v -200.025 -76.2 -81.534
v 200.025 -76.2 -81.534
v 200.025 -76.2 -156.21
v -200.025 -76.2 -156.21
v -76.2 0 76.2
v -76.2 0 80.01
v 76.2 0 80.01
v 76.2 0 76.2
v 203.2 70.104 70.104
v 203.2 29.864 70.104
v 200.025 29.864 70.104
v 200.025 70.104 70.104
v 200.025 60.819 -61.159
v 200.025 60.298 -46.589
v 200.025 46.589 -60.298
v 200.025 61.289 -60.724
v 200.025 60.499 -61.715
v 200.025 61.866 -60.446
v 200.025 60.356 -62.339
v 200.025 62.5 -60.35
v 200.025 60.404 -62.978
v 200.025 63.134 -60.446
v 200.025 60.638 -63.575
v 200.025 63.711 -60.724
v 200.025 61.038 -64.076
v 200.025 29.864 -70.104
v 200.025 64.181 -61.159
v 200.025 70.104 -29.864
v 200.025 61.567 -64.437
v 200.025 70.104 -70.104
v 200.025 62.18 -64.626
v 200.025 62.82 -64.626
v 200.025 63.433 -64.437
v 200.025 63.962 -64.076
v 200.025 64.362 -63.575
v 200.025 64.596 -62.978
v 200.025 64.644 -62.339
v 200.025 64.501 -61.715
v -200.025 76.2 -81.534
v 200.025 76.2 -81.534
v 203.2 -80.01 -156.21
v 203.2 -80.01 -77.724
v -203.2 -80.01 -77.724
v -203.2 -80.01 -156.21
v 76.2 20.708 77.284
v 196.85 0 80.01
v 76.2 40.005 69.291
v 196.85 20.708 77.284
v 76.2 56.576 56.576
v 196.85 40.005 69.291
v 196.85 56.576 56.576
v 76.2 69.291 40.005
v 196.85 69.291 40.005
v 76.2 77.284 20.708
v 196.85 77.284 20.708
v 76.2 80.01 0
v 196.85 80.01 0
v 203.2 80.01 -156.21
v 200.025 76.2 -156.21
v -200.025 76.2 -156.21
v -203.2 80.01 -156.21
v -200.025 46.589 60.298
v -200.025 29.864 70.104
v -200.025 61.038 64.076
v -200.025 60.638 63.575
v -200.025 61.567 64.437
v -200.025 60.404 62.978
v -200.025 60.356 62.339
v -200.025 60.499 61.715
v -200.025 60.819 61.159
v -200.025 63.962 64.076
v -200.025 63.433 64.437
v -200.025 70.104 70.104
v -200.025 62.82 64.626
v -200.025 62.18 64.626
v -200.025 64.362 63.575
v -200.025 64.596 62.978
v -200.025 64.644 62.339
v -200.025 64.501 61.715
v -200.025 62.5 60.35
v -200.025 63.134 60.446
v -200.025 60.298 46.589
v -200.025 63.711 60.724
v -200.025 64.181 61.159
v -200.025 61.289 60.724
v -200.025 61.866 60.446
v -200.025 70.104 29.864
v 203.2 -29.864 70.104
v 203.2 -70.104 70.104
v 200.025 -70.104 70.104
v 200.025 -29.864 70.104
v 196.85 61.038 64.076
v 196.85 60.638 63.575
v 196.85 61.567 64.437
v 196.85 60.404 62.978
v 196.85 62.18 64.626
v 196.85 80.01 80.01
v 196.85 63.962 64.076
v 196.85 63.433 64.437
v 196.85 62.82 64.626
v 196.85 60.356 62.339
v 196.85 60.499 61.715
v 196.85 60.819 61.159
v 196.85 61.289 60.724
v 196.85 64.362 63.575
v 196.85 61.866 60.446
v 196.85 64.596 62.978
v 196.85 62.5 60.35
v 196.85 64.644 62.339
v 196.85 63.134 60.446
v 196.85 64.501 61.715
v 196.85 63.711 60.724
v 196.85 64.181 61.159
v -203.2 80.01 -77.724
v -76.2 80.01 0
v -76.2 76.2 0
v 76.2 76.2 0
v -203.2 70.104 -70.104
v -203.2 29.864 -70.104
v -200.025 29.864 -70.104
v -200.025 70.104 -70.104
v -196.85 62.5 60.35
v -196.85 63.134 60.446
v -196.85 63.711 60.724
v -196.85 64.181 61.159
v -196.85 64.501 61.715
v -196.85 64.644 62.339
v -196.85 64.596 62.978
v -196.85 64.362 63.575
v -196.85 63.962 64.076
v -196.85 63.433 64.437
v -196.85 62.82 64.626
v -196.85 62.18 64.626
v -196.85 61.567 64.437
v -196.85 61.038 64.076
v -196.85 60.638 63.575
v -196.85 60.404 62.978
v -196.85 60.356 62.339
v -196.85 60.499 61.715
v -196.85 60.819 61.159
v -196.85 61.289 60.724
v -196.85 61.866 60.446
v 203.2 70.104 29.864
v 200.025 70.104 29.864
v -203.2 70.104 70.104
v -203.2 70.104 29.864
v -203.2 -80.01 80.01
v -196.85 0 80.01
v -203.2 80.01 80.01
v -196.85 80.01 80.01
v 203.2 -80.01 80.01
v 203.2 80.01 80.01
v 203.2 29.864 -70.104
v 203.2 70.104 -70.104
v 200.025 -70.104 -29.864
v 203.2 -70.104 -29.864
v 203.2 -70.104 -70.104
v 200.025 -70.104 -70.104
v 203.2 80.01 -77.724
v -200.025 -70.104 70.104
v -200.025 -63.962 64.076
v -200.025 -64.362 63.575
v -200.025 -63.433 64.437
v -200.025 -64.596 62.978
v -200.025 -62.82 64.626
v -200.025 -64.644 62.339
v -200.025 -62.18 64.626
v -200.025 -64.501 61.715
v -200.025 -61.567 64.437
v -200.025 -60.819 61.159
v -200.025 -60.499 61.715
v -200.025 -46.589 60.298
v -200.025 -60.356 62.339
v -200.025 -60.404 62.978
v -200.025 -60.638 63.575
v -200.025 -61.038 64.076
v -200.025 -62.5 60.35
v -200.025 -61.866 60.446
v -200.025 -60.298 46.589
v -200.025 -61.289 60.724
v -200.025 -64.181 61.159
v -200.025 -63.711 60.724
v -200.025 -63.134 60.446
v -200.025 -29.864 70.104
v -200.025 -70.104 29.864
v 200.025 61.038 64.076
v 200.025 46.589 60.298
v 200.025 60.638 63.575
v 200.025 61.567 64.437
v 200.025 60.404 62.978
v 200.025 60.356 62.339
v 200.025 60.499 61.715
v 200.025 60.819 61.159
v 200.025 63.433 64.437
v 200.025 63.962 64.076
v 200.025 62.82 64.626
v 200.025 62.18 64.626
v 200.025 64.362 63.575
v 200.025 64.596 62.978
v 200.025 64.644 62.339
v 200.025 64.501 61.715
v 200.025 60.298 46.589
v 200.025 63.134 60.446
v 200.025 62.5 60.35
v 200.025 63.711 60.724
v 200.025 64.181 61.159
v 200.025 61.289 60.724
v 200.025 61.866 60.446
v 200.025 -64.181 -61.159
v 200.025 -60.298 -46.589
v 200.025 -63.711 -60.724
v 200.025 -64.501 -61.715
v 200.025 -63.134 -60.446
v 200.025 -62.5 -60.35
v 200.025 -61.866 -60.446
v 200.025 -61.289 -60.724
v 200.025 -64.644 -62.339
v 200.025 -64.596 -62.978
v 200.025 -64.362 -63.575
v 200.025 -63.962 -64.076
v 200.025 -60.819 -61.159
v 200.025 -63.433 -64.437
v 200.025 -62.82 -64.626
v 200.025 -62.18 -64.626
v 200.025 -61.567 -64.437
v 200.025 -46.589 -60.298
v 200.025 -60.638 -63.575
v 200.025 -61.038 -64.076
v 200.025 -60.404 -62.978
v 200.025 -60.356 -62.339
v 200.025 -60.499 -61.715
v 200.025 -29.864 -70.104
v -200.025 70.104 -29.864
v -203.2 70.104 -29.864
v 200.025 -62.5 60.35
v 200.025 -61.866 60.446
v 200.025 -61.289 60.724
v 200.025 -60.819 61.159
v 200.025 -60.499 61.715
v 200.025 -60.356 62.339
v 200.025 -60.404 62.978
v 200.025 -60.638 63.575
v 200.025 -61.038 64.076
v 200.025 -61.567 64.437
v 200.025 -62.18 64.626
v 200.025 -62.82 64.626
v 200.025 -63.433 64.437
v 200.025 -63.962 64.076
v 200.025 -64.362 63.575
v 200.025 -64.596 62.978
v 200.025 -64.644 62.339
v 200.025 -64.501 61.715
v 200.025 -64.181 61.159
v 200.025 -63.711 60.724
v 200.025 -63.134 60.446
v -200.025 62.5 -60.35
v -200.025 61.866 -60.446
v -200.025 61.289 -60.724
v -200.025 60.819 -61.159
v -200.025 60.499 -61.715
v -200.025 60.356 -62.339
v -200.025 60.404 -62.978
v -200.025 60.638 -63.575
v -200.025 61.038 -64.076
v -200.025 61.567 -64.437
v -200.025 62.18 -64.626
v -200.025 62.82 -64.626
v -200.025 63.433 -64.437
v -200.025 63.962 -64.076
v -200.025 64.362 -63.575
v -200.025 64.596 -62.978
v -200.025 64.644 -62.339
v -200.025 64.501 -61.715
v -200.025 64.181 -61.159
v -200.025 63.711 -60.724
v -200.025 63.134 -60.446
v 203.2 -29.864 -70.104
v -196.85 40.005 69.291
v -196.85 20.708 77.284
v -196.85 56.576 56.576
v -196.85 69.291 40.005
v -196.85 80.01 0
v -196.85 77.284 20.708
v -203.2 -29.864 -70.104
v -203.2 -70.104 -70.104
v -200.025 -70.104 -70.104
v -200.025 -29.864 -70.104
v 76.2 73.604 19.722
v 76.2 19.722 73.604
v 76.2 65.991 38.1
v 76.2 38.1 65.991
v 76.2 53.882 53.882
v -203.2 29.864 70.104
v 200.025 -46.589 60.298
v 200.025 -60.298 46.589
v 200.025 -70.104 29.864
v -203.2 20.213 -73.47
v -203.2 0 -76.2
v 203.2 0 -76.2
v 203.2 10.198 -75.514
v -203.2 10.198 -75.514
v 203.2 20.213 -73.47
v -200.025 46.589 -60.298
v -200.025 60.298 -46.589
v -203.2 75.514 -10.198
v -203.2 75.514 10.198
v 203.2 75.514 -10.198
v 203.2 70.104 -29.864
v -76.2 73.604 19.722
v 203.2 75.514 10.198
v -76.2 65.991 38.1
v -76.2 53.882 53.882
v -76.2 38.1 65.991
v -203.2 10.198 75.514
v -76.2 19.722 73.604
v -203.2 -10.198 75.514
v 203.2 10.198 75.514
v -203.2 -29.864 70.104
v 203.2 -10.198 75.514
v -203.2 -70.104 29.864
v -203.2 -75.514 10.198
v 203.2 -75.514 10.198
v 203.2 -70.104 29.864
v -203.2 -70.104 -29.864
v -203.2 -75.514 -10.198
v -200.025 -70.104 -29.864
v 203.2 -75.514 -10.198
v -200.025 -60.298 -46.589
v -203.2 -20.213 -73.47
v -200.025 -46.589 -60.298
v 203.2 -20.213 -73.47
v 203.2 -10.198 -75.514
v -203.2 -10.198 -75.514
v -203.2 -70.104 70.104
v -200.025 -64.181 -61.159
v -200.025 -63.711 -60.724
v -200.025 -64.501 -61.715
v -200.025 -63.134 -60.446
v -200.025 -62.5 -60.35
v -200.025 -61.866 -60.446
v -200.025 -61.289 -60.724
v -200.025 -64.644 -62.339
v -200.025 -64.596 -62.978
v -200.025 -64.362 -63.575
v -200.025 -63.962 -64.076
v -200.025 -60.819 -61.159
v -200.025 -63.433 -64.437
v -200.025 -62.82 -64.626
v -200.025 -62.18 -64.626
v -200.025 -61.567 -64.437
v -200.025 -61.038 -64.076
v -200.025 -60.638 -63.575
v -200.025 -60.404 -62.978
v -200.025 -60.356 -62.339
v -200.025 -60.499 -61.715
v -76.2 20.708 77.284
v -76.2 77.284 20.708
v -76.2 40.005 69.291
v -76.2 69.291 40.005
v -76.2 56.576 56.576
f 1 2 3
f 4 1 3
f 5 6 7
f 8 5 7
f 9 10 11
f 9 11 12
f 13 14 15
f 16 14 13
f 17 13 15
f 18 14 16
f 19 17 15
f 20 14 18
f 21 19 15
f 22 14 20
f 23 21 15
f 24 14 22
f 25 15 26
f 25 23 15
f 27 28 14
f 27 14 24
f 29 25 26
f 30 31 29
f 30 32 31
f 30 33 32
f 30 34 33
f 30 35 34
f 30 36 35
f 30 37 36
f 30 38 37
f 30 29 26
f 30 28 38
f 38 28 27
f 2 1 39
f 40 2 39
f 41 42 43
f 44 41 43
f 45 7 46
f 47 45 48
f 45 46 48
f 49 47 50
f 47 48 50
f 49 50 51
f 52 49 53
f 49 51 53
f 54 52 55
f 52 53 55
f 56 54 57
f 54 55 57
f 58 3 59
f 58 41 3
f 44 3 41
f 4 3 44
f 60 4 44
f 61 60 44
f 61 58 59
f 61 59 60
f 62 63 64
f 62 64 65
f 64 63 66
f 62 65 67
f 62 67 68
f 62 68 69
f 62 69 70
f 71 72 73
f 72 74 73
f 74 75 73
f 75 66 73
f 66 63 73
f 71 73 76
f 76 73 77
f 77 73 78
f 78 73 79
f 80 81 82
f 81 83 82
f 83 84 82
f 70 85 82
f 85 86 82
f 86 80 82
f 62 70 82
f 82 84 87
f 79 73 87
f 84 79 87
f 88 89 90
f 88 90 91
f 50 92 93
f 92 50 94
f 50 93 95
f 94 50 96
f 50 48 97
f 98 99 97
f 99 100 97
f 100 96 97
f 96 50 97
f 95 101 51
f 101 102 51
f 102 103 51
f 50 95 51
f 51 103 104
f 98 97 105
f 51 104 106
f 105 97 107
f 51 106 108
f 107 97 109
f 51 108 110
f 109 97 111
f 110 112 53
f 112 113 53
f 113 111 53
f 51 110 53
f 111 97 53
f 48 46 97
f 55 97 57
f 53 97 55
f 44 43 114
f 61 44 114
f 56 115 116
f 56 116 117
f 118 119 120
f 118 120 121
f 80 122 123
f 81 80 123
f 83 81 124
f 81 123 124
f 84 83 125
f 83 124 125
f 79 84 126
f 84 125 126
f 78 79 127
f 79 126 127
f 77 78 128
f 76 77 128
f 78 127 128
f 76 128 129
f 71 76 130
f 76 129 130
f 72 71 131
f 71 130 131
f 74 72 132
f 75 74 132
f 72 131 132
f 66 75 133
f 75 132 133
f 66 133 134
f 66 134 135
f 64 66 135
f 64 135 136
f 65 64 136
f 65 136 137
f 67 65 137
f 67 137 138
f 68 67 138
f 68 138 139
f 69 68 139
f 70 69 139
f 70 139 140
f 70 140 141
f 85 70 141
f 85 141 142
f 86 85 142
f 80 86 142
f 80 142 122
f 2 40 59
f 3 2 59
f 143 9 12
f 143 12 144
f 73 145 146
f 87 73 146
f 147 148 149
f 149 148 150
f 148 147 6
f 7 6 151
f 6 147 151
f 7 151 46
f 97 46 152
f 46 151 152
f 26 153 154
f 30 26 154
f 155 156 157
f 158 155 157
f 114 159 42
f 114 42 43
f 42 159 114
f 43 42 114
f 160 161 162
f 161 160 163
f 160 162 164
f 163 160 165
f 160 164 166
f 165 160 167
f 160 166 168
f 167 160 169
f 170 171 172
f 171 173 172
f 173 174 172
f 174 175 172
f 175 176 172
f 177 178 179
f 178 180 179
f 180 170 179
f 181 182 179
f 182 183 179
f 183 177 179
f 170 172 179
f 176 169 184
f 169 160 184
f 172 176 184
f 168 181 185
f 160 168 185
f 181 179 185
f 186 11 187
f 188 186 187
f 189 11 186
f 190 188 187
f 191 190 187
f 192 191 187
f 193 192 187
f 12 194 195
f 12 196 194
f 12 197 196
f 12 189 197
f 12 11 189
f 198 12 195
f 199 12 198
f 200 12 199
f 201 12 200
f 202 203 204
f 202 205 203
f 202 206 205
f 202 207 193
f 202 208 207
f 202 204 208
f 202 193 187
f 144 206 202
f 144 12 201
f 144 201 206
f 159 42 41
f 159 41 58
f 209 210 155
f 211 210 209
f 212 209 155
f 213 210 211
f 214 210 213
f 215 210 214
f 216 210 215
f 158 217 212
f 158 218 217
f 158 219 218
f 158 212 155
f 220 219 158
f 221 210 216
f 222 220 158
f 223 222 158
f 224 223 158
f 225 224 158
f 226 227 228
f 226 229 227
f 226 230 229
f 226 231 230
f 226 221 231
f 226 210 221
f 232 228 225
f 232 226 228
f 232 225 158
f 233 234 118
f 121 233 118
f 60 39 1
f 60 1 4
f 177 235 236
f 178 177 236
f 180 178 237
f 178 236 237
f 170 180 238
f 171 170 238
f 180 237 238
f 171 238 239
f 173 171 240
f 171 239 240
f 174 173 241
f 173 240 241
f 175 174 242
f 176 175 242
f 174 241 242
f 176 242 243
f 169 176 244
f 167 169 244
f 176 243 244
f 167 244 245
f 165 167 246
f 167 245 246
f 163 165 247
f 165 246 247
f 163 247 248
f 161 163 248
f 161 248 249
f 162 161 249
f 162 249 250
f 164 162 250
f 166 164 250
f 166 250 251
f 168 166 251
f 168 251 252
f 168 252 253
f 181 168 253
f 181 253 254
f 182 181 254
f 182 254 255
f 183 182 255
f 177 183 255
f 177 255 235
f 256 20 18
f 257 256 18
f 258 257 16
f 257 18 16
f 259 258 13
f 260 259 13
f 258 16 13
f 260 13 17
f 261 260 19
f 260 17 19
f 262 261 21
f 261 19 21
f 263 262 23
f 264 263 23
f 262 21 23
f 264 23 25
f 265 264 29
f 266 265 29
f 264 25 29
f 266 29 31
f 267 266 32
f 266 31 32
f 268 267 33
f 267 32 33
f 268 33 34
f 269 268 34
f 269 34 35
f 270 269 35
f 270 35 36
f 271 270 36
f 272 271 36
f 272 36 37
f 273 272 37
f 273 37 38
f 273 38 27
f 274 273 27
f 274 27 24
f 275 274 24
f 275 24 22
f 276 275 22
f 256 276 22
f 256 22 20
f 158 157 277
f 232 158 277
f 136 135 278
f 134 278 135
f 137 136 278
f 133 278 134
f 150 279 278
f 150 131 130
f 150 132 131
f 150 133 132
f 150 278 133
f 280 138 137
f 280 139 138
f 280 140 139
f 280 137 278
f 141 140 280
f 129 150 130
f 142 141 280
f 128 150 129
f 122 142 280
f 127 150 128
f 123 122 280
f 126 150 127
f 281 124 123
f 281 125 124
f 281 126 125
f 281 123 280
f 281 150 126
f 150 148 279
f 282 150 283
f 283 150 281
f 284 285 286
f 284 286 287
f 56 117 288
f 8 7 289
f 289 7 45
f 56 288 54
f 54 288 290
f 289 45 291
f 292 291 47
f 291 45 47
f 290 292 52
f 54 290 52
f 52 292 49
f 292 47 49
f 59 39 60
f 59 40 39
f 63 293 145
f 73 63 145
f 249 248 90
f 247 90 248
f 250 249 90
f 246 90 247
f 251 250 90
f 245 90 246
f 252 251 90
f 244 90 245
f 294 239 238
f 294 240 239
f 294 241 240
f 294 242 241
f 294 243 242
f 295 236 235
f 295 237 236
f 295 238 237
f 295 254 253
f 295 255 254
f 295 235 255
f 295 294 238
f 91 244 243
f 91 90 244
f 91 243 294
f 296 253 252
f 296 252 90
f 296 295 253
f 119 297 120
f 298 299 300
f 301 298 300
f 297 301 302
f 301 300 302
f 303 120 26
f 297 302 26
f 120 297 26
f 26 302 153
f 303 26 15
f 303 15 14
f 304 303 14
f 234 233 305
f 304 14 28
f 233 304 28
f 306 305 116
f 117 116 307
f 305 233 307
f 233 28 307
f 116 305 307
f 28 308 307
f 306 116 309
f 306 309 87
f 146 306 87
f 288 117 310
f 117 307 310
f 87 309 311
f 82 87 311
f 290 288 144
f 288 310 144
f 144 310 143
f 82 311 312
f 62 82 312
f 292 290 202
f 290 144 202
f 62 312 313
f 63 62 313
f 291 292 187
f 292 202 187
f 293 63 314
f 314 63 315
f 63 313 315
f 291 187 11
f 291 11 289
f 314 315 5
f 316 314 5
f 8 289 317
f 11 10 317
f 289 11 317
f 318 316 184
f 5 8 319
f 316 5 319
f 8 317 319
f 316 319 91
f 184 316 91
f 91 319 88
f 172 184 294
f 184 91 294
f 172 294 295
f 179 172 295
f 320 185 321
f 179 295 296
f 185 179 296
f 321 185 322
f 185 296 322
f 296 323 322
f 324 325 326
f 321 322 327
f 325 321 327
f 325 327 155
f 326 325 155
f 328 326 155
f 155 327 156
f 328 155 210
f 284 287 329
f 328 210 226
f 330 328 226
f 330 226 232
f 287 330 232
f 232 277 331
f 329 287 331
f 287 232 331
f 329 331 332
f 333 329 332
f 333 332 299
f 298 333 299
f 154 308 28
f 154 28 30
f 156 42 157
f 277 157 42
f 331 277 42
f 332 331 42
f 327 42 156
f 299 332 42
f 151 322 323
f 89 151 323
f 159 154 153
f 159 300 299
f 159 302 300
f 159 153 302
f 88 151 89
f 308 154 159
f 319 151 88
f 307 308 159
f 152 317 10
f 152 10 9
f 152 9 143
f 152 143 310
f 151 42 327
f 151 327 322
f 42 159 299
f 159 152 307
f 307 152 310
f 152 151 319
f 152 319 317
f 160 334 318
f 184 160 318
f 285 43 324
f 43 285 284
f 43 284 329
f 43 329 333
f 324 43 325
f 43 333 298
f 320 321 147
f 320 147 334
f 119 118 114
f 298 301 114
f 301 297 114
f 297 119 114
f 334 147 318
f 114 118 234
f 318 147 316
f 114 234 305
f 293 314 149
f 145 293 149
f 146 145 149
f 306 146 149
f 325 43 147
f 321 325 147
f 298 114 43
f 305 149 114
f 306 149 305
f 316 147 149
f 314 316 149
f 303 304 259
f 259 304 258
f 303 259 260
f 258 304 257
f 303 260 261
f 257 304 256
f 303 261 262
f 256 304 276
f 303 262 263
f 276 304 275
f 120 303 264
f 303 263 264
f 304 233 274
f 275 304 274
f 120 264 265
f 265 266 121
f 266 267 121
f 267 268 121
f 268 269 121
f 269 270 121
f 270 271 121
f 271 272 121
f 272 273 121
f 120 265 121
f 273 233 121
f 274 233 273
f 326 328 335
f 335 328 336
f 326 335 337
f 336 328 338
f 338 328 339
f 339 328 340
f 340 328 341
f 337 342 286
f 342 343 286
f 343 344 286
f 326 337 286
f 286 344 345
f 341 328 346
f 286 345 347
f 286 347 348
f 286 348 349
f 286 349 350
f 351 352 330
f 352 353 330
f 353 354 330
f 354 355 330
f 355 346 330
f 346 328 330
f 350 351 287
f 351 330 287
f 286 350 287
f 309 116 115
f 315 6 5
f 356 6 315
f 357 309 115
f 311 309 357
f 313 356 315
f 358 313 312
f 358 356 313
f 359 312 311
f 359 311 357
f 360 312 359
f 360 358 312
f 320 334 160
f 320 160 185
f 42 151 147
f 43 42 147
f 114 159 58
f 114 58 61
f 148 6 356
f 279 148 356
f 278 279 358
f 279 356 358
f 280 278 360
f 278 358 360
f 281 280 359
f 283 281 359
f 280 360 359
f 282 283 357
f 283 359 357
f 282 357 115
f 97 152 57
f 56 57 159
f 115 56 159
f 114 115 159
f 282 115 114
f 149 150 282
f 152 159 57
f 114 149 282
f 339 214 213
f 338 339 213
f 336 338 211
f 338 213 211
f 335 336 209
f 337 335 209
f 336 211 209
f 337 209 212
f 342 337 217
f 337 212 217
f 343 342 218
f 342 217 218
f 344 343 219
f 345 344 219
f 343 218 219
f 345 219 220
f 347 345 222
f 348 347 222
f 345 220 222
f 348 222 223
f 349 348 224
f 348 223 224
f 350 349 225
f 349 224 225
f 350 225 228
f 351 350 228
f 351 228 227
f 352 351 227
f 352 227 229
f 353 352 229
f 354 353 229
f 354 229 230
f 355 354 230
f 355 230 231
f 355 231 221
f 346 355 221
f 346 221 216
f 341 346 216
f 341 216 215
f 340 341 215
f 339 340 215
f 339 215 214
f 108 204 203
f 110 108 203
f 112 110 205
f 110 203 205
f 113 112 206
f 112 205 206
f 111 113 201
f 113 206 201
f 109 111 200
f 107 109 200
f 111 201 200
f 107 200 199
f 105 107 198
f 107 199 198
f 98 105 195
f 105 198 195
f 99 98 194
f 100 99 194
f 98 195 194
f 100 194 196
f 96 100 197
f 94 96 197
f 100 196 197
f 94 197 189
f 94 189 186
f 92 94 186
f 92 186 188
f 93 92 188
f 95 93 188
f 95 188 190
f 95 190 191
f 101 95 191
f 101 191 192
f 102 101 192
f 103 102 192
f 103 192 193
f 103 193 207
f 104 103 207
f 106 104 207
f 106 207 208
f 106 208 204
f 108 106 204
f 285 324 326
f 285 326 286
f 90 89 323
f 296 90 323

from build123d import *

# Parameters (mm, degrees)
SKETCH7_W           = 160.02
SKETCH7_H           = 160.02
BOSS_EXTRUDE4_DEPTH = 203.2
CUT_EXTRUDE3_DEPTH  = 196.85
SKETCH9_R           = 76.2
CUT_EXTRUDE4_DEPTH  = 422.85798582
SKETCH10_W          = 140.208
SKETCH10_H          = 140.208
CUT_EXTRUDE5_DEPTH  = 3.175
SKETCH11_W          = 152.4
SKETCH11_H          = 80.01
CUT_EXTRUDE6_DEPTH  = 80.01
SKETCH13_W          = 406.4
SKETCH13_H          = 160.02
BOSS_EXTRUDE6_DEPTH = 76.2
SKETCH15_W          = 74.676
SKETCH15_H          = 152.4
CUT_EXTRUDE7_DEPTH  = 200.025
SKETCH16_R          = 2.14999951
CUT_EXTRUDE8_DEPTH  = 440.765352006


with BuildPart() as part:
    # Sketch7 → Boss-Extrude4 (new, symmetric)
    with BuildSketch(Plane(origin=(0, 0, 0), x_dir=(0, 0, -1), z_dir=(1, 0, 0))):
        Rectangle(SKETCH7_W, SKETCH7_H)
    extrude(amount=BOSS_EXTRUDE4_DEPTH, both=True)

    # Sketch8 → Cut-Extrude3 (cut, symmetric)
    with BuildSketch(Plane(origin=(0, 0, 0), x_dir=(0, 0, -1), z_dir=(1, 0, 0))):
        with BuildLine():
            Line((-80.01, 80.01), (-80.01, 0))
            ThreePointArc((-80.01, 0), (-56.575613563, 56.575613563), (0, 80.01))
            Line((0, 80.01), (-80.01, 80.01))
        make_face()
    extrude(amount=CUT_EXTRUDE3_DEPTH, both=True, mode=Mode.SUBTRACT)

    # Sketch9 → Cut-Extrude4 (cut, through all)
    with BuildSketch(Plane(origin=(203.2, 0, 0), x_dir=(0, 0, -1), z_dir=(1, 0, 0))):
        Circle(SKETCH9_R)
    extrude(amount=-CUT_EXTRUDE4_DEPTH, mode=Mode.SUBTRACT)

    # Sketch10 → Cut-Extrude5 (cut)
    with BuildSketch(Plane(origin=(203.2, 0, 0), x_dir=(0, 0, -1), z_dir=(1, 0, 0))):
        Rectangle(SKETCH10_W, SKETCH10_H)
    cut_extrude5 = extrude(amount=-CUT_EXTRUDE5_DEPTH, mode=Mode.SUBTRACT)

    # Sketch11 → Cut-Extrude6 (cut)
    with BuildSketch(Plane.XY.offset(80.01)):
        with Locations((0, 40.005)):
            Rectangle(SKETCH11_W, SKETCH11_H)
    extrude(amount=-CUT_EXTRUDE6_DEPTH, mode=Mode.SUBTRACT)

    # Mirror1: Cut-Extrude5 across plane
    add(cut_extrude5.mirror(Plane(origin=(0, 0, 0), x_dir=(0, 0, 1), z_dir=(1, 0, 0))), mode=Mode.SUBTRACT)

    # Sketch13 → Boss-Extrude6 (add)
    with BuildSketch(Plane(origin=(0, 0, -80.01), x_dir=(-1, 0, 0), z_dir=(0, 0, -1))):
        Rectangle(SKETCH13_W, SKETCH13_H)
    extrude(amount=BOSS_EXTRUDE6_DEPTH)

    # Sketch15 → Cut-Extrude7 (cut, symmetric)
    with BuildSketch(Plane(origin=(0, 0, 0), x_dir=(0, 0, -1), z_dir=(1, 0, 0))):
        with Locations((118.872, 0)):
            Rectangle(SKETCH15_W, SKETCH15_H)
    extrude(amount=CUT_EXTRUDE7_DEPTH, both=True, mode=Mode.SUBTRACT)

    # Sketch16 → Cut-Extrude8 (cut, through all)
    with BuildSketch(Plane(origin=(200.025, 0, 0), x_dir=(0, 0, -1), z_dir=(1, 0, 0))):
        with Locations((-62.500002, 62.500002)):
            Circle(SKETCH16_R)
        with Locations(Location((62.500002, 62.500002, 0), (0, 0, 180))):
            Circle(SKETCH16_R)
        with Locations((-62.500002, -62.500002)):
            Circle(SKETCH16_R)
        with Locations(Location((62.500002, -62.500002, 0), (0, 0, 180))):
            Circle(SKETCH16_R)
    extrude(amount=-CUT_EXTRUDE8_DEPTH, mode=Mode.SUBTRACT)


with BuildPart() as body_2:
    # Split1: the piece on the far side of the plane
    add(part.part)
    split(bisect_by=Plane(origin=(0, 0, -77.724), x_dir=(-1, 0, 0), z_dir=(0, 0, -1)), keep=Keep.BOTTOM)


with BuildPart() as part_1:
    add(part.part)

    # Split1
    split(bisect_by=Plane(origin=(0, 0, -77.724), x_dir=(-1, 0, 0), z_dir=(0, 0, -1)), keep=Keep.TOP)


solid = Compound([body_2.part, part_1.part])
